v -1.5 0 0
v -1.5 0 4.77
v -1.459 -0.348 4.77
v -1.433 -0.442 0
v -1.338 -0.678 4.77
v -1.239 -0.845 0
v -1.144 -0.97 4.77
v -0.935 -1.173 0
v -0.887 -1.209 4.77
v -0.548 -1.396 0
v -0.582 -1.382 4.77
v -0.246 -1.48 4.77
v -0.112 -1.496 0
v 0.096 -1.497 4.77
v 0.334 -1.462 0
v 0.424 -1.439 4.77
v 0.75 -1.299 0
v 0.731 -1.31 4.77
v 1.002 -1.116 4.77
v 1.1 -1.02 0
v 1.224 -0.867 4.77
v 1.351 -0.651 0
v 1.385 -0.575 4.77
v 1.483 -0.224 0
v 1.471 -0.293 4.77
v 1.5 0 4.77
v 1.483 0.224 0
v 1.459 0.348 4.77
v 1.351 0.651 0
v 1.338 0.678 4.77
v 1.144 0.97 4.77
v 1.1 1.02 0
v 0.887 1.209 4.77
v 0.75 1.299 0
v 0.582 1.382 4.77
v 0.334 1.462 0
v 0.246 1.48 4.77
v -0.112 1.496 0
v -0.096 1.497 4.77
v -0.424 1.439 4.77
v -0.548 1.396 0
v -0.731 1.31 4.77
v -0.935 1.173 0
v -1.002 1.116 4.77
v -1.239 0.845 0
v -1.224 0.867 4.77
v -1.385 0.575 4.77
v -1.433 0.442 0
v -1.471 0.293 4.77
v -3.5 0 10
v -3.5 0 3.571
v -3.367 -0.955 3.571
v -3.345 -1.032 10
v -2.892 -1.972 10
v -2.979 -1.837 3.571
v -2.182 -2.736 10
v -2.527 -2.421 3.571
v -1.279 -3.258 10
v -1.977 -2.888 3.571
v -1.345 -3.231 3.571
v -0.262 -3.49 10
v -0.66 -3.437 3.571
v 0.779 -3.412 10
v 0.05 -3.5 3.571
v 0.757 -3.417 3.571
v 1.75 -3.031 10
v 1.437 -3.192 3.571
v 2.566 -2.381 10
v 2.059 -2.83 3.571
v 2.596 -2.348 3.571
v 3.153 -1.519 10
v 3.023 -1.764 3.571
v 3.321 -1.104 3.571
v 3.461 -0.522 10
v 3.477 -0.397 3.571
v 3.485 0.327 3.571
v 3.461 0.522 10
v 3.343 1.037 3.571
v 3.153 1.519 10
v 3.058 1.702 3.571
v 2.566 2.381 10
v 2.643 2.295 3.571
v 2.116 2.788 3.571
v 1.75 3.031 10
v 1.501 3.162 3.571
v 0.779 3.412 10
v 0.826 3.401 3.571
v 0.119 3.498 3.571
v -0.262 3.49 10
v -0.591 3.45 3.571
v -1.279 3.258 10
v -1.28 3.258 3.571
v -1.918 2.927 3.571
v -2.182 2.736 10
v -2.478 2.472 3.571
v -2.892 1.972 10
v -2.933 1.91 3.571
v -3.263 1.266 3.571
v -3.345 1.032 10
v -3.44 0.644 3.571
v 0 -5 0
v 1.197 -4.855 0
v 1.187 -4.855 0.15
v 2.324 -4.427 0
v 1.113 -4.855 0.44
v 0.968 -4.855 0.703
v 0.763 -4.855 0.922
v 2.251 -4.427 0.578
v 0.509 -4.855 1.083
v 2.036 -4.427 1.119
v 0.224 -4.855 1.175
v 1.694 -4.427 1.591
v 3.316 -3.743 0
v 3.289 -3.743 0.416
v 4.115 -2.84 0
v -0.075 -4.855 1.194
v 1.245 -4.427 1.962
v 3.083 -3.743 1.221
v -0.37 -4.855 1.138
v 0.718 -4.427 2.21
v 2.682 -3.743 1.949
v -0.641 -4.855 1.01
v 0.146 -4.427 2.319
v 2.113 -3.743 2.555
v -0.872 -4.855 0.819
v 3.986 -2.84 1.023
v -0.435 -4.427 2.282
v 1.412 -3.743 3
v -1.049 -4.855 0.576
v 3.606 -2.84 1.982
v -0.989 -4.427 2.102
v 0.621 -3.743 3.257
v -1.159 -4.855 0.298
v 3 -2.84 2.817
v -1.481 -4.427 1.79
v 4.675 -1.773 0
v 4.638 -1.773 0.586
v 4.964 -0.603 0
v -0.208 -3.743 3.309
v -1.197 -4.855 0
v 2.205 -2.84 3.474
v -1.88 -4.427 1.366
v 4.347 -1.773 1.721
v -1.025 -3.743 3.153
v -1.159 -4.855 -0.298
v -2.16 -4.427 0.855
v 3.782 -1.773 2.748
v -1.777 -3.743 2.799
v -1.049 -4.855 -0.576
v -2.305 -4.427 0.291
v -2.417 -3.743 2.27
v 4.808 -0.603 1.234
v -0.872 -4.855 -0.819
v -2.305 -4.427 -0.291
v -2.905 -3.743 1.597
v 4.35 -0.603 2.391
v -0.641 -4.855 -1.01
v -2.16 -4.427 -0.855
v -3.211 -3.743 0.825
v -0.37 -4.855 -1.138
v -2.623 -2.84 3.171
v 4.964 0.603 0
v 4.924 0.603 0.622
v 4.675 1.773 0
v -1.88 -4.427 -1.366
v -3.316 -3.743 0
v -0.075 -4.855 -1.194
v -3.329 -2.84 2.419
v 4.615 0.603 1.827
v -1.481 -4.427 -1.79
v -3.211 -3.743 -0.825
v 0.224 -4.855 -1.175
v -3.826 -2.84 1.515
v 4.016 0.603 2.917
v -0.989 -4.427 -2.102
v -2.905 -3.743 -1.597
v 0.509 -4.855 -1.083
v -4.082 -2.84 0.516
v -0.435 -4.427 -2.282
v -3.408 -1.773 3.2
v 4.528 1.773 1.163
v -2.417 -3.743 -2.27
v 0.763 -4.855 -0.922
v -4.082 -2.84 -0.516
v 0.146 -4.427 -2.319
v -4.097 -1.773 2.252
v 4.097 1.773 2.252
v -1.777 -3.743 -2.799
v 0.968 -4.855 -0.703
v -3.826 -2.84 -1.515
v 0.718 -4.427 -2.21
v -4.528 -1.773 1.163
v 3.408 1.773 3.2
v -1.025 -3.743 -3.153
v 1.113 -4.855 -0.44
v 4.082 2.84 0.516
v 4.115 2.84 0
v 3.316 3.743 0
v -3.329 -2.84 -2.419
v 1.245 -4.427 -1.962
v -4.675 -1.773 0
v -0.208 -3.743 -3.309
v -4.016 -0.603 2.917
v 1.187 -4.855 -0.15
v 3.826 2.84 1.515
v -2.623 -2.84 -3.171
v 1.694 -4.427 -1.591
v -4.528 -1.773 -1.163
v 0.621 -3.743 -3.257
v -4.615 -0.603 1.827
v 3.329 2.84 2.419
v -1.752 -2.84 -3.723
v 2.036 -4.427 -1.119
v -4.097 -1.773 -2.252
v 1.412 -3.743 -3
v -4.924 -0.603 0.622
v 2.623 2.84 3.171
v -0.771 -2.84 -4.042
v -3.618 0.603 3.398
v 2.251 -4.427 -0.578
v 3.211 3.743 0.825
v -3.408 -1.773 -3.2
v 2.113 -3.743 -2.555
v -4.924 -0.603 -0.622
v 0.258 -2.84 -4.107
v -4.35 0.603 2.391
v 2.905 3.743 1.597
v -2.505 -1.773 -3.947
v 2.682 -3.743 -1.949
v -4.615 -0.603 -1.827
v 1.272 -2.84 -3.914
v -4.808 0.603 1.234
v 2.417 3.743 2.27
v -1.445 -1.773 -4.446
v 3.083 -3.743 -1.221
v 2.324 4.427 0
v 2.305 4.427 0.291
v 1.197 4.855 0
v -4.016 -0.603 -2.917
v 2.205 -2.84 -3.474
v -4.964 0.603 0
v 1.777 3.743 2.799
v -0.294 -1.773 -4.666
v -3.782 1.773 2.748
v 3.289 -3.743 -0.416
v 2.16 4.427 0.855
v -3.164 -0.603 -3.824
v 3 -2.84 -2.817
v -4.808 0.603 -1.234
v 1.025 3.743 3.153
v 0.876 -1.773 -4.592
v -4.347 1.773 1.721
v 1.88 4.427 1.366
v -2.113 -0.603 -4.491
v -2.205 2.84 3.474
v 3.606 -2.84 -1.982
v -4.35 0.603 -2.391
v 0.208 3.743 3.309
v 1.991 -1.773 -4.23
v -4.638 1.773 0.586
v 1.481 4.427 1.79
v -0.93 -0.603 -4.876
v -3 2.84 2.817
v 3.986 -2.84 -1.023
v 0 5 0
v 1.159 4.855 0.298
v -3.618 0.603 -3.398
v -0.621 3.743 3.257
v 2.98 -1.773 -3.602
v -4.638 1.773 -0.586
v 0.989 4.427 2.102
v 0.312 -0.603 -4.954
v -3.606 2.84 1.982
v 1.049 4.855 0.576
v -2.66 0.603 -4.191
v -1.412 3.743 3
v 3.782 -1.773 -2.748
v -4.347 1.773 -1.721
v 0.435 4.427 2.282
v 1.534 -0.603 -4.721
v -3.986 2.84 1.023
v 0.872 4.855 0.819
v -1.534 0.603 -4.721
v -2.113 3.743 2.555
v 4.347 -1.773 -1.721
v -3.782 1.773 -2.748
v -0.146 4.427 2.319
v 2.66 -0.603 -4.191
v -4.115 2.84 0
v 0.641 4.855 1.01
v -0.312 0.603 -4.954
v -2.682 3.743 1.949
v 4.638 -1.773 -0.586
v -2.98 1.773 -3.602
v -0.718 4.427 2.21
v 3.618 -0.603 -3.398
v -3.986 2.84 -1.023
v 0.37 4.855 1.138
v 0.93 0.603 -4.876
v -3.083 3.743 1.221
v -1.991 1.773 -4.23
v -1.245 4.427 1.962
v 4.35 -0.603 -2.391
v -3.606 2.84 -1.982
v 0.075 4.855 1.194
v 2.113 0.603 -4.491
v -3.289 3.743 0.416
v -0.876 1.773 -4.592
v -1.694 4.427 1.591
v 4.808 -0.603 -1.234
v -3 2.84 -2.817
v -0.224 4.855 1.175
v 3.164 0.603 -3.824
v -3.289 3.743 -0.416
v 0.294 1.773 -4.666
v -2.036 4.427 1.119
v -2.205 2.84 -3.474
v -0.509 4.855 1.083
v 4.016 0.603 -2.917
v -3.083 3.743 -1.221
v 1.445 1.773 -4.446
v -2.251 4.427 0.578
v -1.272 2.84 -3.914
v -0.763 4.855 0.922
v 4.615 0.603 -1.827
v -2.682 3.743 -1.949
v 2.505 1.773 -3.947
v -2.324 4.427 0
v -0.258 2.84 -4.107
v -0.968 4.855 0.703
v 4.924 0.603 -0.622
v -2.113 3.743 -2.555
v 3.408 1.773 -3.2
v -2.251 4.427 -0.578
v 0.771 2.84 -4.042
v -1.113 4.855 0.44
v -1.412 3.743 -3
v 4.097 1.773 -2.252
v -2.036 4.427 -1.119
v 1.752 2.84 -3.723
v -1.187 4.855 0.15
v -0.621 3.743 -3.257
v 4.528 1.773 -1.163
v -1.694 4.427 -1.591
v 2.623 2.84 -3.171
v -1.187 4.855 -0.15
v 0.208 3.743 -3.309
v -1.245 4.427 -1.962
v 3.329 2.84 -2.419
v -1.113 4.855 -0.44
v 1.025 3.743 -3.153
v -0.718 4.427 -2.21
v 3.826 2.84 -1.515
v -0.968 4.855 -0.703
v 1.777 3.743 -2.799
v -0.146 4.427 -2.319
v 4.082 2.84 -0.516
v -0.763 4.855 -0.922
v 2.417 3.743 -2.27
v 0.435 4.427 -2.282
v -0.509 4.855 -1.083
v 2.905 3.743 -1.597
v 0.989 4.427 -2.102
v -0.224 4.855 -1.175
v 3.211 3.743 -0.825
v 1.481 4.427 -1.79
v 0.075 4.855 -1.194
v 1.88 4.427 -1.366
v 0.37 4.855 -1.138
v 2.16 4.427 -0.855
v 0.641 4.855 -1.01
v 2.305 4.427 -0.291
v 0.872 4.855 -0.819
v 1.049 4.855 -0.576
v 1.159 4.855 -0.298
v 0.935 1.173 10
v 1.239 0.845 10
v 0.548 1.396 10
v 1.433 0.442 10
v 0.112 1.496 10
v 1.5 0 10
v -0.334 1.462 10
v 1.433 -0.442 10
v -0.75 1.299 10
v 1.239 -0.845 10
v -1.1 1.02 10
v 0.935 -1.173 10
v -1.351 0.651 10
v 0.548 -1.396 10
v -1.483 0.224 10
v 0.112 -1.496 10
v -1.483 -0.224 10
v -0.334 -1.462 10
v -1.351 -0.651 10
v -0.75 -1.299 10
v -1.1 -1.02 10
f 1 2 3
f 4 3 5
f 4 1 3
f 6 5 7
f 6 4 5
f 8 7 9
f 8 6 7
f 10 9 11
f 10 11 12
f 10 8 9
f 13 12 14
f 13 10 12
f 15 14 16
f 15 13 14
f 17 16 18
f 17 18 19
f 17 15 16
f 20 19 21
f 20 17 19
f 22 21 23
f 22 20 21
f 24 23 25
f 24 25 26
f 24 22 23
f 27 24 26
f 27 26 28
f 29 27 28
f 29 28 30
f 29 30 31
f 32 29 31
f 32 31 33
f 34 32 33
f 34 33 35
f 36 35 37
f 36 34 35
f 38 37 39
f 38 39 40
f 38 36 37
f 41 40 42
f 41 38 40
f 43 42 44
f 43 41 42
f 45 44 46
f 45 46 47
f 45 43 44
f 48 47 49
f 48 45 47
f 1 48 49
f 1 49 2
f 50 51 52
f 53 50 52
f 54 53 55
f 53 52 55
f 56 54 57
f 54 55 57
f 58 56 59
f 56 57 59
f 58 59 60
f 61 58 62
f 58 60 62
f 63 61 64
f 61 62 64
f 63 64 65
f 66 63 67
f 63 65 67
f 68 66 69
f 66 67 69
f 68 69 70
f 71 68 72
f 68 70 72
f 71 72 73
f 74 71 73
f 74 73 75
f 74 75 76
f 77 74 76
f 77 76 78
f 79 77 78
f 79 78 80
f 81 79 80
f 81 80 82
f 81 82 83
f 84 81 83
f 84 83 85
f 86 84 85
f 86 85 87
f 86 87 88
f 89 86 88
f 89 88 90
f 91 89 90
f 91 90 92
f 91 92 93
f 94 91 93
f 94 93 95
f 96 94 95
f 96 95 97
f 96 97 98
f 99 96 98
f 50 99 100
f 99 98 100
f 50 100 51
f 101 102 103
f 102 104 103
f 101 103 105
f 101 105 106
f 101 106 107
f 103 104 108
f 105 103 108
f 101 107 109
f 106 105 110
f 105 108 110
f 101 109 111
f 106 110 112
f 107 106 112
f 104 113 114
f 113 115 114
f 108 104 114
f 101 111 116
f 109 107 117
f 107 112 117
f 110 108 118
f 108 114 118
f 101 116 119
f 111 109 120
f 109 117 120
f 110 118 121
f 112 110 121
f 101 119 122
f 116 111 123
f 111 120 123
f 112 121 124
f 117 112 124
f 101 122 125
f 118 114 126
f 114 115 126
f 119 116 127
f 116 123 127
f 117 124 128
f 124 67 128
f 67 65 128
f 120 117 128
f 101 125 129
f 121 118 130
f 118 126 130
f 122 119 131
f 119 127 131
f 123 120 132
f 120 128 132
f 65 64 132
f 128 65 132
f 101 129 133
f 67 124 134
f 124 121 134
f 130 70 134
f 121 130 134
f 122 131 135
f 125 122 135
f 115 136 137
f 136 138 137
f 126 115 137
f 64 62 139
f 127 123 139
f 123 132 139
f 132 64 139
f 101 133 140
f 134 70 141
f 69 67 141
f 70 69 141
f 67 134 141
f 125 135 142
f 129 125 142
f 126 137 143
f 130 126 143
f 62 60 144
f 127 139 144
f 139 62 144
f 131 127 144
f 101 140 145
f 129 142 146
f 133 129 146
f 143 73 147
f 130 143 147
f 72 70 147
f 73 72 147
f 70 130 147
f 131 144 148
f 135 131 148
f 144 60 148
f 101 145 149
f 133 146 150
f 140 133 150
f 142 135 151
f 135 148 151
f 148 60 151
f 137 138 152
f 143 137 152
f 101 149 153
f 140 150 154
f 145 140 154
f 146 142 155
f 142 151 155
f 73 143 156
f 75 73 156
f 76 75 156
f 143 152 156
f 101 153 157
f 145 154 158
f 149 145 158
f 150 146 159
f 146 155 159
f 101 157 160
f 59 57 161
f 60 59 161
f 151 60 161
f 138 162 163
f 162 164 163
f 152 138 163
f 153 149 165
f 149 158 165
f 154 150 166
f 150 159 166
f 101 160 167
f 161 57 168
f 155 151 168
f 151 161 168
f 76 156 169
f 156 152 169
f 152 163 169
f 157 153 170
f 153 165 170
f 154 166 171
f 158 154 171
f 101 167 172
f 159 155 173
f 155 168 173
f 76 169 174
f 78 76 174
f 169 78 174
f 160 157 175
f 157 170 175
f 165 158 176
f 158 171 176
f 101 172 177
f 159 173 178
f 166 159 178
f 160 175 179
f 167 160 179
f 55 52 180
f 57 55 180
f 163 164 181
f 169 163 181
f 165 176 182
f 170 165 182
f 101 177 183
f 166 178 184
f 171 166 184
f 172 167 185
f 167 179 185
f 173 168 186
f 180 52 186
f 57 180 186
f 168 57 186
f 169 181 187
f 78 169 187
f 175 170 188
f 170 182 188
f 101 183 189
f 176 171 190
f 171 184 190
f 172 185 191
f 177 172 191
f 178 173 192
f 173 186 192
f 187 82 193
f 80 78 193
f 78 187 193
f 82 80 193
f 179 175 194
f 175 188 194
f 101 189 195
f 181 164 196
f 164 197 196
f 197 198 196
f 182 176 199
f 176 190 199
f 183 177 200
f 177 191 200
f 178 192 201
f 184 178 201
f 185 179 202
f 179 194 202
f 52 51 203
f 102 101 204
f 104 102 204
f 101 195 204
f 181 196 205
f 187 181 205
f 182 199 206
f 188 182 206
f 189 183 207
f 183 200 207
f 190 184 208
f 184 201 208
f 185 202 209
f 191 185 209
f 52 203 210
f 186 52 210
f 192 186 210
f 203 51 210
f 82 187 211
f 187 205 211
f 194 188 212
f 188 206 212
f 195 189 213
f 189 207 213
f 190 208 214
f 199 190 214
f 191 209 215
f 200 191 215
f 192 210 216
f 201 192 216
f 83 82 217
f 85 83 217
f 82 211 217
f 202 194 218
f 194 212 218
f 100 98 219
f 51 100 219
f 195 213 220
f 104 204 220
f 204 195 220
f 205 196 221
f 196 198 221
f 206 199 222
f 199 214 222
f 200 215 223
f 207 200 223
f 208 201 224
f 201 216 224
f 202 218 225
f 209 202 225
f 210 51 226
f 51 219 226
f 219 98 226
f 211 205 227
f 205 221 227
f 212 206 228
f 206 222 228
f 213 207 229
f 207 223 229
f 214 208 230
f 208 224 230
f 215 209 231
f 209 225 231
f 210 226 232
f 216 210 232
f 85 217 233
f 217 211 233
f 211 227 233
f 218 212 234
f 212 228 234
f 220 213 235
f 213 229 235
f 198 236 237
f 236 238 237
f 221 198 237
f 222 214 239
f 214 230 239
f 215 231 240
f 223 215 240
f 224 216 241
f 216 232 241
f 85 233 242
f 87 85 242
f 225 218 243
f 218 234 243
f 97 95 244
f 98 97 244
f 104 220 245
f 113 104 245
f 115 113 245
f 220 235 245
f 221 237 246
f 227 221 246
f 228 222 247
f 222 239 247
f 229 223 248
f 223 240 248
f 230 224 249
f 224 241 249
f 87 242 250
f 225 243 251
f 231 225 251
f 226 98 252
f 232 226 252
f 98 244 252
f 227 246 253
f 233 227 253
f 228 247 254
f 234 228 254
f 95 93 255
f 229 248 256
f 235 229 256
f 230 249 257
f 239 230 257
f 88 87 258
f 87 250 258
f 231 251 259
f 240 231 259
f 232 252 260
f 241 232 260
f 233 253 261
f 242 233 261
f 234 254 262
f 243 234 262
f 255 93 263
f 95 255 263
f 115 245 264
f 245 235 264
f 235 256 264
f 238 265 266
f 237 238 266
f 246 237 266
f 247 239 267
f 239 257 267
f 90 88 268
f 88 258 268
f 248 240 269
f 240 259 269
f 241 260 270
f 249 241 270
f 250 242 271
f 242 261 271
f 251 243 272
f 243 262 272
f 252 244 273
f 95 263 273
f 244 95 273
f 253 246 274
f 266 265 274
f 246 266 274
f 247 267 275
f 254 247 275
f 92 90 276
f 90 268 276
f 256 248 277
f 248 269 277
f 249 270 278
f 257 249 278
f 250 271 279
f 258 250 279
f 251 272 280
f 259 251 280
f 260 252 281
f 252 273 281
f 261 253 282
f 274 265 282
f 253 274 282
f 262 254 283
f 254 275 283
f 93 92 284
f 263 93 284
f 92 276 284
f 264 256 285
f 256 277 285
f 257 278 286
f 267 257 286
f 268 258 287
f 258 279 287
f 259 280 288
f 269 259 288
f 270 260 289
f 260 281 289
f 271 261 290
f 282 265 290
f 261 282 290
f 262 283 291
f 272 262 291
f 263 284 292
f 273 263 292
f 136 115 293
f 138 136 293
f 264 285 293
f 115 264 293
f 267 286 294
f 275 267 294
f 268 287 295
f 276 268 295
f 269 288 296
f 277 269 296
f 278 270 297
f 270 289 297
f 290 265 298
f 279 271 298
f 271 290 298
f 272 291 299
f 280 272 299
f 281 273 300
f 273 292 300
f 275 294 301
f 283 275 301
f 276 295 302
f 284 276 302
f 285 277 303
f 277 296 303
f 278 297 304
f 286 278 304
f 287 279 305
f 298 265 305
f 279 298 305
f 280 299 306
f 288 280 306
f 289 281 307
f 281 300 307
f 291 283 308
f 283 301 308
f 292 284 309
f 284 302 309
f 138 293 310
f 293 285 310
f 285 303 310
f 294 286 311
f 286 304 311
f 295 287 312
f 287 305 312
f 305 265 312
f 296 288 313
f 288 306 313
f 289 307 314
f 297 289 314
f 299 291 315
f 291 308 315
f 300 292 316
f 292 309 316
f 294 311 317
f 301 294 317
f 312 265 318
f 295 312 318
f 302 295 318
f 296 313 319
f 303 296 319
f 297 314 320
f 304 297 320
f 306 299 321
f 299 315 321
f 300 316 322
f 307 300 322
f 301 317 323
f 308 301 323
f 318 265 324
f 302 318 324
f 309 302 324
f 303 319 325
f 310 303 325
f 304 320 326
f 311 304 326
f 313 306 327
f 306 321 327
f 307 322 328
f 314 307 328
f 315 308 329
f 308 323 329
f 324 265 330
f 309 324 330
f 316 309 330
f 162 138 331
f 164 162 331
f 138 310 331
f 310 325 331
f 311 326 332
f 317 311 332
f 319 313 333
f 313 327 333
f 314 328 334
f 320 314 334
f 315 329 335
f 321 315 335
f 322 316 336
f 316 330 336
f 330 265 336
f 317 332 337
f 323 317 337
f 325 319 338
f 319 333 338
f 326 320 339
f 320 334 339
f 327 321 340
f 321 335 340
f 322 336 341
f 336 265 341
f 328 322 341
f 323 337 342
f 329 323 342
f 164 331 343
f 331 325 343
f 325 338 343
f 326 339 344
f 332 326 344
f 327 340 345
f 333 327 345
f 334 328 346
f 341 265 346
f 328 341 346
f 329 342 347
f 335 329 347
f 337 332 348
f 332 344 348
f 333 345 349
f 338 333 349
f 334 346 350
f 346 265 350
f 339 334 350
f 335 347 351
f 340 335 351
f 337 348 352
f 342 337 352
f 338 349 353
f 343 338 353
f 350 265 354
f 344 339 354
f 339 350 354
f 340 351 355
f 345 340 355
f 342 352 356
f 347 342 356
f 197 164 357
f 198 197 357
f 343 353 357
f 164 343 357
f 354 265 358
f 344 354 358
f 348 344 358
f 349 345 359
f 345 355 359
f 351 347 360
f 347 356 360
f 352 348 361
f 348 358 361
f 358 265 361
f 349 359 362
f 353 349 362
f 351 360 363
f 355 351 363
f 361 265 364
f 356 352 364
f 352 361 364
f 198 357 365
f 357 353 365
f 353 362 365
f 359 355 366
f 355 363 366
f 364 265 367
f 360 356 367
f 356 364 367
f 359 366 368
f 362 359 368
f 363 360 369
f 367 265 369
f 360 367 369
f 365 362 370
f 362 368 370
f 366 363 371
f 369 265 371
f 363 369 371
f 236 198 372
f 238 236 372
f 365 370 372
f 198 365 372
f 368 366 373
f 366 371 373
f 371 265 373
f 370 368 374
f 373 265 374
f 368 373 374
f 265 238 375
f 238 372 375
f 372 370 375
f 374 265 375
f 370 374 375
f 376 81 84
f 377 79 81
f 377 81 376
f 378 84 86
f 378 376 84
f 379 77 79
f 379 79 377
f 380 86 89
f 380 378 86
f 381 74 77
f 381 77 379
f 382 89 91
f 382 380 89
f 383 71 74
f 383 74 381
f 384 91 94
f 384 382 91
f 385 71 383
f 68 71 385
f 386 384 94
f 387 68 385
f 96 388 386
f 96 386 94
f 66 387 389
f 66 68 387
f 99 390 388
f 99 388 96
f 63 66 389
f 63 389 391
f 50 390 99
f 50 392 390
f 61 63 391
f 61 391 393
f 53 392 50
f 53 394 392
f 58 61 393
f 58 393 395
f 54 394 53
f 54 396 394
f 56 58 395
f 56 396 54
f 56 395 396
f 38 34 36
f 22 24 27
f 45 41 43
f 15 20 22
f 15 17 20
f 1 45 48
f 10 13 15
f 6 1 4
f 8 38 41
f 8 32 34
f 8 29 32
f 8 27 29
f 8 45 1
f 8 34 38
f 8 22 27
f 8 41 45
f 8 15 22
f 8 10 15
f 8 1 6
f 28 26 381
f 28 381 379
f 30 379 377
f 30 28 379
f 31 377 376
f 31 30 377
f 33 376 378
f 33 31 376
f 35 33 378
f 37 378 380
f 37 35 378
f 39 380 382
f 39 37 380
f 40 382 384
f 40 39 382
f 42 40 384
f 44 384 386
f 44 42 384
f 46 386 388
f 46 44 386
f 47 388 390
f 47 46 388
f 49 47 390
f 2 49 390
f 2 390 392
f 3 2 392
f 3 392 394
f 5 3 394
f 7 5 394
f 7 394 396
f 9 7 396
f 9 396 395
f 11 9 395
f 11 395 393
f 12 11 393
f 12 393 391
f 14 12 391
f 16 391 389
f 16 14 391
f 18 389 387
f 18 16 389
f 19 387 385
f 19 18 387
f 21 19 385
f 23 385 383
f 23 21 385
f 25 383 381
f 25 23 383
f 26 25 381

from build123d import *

# Parameters (mm, degrees)
SKETCH2_R           = 1.5
CUT_EXTRUDE1_DEPTH  = 6
SKETCH2_3_R         = 3.5
SKETCH2_3_R_2       = 1.5
BOSS_EXTRUDE1_DEPTH = 10


with BuildPart() as part:
    # Sketch1 → Revolve1 (revolve)
    with BuildSketch(Plane.XY):
        with BuildLine():
            Line((0, 5), (0, -5))
            ThreePointArc((0, -5), (5, 0), (0, 5))
        make_face()
    revolve(axis=Axis((0, 5, 0), (0, -1, 0)))

    # Sketch2 → Cut-Extrude1 (cut, through all)
    with BuildSketch(Plane.XY):
        with Locations(Location((0, 0, 0), (0, 0, 180))):  # turned: the seam where the file's is
            Circle(SKETCH2_R)
    extrude(amount=CUT_EXTRUDE1_DEPTH, mode=Mode.SUBTRACT)

    # Sketch2_3 → Boss-Extrude1 (add)
    with BuildSketch(Plane.XY):
        with Locations(Location((0, 0, 0), (0, 0, 180))):  # turned: the seam where the file's is
            Circle(SKETCH2_3_R)
        Circle(SKETCH2_3_R_2, mode=Mode.SUBTRACT)
    extrude(amount=BOSS_EXTRUDE1_DEPTH)


solid = part.part
